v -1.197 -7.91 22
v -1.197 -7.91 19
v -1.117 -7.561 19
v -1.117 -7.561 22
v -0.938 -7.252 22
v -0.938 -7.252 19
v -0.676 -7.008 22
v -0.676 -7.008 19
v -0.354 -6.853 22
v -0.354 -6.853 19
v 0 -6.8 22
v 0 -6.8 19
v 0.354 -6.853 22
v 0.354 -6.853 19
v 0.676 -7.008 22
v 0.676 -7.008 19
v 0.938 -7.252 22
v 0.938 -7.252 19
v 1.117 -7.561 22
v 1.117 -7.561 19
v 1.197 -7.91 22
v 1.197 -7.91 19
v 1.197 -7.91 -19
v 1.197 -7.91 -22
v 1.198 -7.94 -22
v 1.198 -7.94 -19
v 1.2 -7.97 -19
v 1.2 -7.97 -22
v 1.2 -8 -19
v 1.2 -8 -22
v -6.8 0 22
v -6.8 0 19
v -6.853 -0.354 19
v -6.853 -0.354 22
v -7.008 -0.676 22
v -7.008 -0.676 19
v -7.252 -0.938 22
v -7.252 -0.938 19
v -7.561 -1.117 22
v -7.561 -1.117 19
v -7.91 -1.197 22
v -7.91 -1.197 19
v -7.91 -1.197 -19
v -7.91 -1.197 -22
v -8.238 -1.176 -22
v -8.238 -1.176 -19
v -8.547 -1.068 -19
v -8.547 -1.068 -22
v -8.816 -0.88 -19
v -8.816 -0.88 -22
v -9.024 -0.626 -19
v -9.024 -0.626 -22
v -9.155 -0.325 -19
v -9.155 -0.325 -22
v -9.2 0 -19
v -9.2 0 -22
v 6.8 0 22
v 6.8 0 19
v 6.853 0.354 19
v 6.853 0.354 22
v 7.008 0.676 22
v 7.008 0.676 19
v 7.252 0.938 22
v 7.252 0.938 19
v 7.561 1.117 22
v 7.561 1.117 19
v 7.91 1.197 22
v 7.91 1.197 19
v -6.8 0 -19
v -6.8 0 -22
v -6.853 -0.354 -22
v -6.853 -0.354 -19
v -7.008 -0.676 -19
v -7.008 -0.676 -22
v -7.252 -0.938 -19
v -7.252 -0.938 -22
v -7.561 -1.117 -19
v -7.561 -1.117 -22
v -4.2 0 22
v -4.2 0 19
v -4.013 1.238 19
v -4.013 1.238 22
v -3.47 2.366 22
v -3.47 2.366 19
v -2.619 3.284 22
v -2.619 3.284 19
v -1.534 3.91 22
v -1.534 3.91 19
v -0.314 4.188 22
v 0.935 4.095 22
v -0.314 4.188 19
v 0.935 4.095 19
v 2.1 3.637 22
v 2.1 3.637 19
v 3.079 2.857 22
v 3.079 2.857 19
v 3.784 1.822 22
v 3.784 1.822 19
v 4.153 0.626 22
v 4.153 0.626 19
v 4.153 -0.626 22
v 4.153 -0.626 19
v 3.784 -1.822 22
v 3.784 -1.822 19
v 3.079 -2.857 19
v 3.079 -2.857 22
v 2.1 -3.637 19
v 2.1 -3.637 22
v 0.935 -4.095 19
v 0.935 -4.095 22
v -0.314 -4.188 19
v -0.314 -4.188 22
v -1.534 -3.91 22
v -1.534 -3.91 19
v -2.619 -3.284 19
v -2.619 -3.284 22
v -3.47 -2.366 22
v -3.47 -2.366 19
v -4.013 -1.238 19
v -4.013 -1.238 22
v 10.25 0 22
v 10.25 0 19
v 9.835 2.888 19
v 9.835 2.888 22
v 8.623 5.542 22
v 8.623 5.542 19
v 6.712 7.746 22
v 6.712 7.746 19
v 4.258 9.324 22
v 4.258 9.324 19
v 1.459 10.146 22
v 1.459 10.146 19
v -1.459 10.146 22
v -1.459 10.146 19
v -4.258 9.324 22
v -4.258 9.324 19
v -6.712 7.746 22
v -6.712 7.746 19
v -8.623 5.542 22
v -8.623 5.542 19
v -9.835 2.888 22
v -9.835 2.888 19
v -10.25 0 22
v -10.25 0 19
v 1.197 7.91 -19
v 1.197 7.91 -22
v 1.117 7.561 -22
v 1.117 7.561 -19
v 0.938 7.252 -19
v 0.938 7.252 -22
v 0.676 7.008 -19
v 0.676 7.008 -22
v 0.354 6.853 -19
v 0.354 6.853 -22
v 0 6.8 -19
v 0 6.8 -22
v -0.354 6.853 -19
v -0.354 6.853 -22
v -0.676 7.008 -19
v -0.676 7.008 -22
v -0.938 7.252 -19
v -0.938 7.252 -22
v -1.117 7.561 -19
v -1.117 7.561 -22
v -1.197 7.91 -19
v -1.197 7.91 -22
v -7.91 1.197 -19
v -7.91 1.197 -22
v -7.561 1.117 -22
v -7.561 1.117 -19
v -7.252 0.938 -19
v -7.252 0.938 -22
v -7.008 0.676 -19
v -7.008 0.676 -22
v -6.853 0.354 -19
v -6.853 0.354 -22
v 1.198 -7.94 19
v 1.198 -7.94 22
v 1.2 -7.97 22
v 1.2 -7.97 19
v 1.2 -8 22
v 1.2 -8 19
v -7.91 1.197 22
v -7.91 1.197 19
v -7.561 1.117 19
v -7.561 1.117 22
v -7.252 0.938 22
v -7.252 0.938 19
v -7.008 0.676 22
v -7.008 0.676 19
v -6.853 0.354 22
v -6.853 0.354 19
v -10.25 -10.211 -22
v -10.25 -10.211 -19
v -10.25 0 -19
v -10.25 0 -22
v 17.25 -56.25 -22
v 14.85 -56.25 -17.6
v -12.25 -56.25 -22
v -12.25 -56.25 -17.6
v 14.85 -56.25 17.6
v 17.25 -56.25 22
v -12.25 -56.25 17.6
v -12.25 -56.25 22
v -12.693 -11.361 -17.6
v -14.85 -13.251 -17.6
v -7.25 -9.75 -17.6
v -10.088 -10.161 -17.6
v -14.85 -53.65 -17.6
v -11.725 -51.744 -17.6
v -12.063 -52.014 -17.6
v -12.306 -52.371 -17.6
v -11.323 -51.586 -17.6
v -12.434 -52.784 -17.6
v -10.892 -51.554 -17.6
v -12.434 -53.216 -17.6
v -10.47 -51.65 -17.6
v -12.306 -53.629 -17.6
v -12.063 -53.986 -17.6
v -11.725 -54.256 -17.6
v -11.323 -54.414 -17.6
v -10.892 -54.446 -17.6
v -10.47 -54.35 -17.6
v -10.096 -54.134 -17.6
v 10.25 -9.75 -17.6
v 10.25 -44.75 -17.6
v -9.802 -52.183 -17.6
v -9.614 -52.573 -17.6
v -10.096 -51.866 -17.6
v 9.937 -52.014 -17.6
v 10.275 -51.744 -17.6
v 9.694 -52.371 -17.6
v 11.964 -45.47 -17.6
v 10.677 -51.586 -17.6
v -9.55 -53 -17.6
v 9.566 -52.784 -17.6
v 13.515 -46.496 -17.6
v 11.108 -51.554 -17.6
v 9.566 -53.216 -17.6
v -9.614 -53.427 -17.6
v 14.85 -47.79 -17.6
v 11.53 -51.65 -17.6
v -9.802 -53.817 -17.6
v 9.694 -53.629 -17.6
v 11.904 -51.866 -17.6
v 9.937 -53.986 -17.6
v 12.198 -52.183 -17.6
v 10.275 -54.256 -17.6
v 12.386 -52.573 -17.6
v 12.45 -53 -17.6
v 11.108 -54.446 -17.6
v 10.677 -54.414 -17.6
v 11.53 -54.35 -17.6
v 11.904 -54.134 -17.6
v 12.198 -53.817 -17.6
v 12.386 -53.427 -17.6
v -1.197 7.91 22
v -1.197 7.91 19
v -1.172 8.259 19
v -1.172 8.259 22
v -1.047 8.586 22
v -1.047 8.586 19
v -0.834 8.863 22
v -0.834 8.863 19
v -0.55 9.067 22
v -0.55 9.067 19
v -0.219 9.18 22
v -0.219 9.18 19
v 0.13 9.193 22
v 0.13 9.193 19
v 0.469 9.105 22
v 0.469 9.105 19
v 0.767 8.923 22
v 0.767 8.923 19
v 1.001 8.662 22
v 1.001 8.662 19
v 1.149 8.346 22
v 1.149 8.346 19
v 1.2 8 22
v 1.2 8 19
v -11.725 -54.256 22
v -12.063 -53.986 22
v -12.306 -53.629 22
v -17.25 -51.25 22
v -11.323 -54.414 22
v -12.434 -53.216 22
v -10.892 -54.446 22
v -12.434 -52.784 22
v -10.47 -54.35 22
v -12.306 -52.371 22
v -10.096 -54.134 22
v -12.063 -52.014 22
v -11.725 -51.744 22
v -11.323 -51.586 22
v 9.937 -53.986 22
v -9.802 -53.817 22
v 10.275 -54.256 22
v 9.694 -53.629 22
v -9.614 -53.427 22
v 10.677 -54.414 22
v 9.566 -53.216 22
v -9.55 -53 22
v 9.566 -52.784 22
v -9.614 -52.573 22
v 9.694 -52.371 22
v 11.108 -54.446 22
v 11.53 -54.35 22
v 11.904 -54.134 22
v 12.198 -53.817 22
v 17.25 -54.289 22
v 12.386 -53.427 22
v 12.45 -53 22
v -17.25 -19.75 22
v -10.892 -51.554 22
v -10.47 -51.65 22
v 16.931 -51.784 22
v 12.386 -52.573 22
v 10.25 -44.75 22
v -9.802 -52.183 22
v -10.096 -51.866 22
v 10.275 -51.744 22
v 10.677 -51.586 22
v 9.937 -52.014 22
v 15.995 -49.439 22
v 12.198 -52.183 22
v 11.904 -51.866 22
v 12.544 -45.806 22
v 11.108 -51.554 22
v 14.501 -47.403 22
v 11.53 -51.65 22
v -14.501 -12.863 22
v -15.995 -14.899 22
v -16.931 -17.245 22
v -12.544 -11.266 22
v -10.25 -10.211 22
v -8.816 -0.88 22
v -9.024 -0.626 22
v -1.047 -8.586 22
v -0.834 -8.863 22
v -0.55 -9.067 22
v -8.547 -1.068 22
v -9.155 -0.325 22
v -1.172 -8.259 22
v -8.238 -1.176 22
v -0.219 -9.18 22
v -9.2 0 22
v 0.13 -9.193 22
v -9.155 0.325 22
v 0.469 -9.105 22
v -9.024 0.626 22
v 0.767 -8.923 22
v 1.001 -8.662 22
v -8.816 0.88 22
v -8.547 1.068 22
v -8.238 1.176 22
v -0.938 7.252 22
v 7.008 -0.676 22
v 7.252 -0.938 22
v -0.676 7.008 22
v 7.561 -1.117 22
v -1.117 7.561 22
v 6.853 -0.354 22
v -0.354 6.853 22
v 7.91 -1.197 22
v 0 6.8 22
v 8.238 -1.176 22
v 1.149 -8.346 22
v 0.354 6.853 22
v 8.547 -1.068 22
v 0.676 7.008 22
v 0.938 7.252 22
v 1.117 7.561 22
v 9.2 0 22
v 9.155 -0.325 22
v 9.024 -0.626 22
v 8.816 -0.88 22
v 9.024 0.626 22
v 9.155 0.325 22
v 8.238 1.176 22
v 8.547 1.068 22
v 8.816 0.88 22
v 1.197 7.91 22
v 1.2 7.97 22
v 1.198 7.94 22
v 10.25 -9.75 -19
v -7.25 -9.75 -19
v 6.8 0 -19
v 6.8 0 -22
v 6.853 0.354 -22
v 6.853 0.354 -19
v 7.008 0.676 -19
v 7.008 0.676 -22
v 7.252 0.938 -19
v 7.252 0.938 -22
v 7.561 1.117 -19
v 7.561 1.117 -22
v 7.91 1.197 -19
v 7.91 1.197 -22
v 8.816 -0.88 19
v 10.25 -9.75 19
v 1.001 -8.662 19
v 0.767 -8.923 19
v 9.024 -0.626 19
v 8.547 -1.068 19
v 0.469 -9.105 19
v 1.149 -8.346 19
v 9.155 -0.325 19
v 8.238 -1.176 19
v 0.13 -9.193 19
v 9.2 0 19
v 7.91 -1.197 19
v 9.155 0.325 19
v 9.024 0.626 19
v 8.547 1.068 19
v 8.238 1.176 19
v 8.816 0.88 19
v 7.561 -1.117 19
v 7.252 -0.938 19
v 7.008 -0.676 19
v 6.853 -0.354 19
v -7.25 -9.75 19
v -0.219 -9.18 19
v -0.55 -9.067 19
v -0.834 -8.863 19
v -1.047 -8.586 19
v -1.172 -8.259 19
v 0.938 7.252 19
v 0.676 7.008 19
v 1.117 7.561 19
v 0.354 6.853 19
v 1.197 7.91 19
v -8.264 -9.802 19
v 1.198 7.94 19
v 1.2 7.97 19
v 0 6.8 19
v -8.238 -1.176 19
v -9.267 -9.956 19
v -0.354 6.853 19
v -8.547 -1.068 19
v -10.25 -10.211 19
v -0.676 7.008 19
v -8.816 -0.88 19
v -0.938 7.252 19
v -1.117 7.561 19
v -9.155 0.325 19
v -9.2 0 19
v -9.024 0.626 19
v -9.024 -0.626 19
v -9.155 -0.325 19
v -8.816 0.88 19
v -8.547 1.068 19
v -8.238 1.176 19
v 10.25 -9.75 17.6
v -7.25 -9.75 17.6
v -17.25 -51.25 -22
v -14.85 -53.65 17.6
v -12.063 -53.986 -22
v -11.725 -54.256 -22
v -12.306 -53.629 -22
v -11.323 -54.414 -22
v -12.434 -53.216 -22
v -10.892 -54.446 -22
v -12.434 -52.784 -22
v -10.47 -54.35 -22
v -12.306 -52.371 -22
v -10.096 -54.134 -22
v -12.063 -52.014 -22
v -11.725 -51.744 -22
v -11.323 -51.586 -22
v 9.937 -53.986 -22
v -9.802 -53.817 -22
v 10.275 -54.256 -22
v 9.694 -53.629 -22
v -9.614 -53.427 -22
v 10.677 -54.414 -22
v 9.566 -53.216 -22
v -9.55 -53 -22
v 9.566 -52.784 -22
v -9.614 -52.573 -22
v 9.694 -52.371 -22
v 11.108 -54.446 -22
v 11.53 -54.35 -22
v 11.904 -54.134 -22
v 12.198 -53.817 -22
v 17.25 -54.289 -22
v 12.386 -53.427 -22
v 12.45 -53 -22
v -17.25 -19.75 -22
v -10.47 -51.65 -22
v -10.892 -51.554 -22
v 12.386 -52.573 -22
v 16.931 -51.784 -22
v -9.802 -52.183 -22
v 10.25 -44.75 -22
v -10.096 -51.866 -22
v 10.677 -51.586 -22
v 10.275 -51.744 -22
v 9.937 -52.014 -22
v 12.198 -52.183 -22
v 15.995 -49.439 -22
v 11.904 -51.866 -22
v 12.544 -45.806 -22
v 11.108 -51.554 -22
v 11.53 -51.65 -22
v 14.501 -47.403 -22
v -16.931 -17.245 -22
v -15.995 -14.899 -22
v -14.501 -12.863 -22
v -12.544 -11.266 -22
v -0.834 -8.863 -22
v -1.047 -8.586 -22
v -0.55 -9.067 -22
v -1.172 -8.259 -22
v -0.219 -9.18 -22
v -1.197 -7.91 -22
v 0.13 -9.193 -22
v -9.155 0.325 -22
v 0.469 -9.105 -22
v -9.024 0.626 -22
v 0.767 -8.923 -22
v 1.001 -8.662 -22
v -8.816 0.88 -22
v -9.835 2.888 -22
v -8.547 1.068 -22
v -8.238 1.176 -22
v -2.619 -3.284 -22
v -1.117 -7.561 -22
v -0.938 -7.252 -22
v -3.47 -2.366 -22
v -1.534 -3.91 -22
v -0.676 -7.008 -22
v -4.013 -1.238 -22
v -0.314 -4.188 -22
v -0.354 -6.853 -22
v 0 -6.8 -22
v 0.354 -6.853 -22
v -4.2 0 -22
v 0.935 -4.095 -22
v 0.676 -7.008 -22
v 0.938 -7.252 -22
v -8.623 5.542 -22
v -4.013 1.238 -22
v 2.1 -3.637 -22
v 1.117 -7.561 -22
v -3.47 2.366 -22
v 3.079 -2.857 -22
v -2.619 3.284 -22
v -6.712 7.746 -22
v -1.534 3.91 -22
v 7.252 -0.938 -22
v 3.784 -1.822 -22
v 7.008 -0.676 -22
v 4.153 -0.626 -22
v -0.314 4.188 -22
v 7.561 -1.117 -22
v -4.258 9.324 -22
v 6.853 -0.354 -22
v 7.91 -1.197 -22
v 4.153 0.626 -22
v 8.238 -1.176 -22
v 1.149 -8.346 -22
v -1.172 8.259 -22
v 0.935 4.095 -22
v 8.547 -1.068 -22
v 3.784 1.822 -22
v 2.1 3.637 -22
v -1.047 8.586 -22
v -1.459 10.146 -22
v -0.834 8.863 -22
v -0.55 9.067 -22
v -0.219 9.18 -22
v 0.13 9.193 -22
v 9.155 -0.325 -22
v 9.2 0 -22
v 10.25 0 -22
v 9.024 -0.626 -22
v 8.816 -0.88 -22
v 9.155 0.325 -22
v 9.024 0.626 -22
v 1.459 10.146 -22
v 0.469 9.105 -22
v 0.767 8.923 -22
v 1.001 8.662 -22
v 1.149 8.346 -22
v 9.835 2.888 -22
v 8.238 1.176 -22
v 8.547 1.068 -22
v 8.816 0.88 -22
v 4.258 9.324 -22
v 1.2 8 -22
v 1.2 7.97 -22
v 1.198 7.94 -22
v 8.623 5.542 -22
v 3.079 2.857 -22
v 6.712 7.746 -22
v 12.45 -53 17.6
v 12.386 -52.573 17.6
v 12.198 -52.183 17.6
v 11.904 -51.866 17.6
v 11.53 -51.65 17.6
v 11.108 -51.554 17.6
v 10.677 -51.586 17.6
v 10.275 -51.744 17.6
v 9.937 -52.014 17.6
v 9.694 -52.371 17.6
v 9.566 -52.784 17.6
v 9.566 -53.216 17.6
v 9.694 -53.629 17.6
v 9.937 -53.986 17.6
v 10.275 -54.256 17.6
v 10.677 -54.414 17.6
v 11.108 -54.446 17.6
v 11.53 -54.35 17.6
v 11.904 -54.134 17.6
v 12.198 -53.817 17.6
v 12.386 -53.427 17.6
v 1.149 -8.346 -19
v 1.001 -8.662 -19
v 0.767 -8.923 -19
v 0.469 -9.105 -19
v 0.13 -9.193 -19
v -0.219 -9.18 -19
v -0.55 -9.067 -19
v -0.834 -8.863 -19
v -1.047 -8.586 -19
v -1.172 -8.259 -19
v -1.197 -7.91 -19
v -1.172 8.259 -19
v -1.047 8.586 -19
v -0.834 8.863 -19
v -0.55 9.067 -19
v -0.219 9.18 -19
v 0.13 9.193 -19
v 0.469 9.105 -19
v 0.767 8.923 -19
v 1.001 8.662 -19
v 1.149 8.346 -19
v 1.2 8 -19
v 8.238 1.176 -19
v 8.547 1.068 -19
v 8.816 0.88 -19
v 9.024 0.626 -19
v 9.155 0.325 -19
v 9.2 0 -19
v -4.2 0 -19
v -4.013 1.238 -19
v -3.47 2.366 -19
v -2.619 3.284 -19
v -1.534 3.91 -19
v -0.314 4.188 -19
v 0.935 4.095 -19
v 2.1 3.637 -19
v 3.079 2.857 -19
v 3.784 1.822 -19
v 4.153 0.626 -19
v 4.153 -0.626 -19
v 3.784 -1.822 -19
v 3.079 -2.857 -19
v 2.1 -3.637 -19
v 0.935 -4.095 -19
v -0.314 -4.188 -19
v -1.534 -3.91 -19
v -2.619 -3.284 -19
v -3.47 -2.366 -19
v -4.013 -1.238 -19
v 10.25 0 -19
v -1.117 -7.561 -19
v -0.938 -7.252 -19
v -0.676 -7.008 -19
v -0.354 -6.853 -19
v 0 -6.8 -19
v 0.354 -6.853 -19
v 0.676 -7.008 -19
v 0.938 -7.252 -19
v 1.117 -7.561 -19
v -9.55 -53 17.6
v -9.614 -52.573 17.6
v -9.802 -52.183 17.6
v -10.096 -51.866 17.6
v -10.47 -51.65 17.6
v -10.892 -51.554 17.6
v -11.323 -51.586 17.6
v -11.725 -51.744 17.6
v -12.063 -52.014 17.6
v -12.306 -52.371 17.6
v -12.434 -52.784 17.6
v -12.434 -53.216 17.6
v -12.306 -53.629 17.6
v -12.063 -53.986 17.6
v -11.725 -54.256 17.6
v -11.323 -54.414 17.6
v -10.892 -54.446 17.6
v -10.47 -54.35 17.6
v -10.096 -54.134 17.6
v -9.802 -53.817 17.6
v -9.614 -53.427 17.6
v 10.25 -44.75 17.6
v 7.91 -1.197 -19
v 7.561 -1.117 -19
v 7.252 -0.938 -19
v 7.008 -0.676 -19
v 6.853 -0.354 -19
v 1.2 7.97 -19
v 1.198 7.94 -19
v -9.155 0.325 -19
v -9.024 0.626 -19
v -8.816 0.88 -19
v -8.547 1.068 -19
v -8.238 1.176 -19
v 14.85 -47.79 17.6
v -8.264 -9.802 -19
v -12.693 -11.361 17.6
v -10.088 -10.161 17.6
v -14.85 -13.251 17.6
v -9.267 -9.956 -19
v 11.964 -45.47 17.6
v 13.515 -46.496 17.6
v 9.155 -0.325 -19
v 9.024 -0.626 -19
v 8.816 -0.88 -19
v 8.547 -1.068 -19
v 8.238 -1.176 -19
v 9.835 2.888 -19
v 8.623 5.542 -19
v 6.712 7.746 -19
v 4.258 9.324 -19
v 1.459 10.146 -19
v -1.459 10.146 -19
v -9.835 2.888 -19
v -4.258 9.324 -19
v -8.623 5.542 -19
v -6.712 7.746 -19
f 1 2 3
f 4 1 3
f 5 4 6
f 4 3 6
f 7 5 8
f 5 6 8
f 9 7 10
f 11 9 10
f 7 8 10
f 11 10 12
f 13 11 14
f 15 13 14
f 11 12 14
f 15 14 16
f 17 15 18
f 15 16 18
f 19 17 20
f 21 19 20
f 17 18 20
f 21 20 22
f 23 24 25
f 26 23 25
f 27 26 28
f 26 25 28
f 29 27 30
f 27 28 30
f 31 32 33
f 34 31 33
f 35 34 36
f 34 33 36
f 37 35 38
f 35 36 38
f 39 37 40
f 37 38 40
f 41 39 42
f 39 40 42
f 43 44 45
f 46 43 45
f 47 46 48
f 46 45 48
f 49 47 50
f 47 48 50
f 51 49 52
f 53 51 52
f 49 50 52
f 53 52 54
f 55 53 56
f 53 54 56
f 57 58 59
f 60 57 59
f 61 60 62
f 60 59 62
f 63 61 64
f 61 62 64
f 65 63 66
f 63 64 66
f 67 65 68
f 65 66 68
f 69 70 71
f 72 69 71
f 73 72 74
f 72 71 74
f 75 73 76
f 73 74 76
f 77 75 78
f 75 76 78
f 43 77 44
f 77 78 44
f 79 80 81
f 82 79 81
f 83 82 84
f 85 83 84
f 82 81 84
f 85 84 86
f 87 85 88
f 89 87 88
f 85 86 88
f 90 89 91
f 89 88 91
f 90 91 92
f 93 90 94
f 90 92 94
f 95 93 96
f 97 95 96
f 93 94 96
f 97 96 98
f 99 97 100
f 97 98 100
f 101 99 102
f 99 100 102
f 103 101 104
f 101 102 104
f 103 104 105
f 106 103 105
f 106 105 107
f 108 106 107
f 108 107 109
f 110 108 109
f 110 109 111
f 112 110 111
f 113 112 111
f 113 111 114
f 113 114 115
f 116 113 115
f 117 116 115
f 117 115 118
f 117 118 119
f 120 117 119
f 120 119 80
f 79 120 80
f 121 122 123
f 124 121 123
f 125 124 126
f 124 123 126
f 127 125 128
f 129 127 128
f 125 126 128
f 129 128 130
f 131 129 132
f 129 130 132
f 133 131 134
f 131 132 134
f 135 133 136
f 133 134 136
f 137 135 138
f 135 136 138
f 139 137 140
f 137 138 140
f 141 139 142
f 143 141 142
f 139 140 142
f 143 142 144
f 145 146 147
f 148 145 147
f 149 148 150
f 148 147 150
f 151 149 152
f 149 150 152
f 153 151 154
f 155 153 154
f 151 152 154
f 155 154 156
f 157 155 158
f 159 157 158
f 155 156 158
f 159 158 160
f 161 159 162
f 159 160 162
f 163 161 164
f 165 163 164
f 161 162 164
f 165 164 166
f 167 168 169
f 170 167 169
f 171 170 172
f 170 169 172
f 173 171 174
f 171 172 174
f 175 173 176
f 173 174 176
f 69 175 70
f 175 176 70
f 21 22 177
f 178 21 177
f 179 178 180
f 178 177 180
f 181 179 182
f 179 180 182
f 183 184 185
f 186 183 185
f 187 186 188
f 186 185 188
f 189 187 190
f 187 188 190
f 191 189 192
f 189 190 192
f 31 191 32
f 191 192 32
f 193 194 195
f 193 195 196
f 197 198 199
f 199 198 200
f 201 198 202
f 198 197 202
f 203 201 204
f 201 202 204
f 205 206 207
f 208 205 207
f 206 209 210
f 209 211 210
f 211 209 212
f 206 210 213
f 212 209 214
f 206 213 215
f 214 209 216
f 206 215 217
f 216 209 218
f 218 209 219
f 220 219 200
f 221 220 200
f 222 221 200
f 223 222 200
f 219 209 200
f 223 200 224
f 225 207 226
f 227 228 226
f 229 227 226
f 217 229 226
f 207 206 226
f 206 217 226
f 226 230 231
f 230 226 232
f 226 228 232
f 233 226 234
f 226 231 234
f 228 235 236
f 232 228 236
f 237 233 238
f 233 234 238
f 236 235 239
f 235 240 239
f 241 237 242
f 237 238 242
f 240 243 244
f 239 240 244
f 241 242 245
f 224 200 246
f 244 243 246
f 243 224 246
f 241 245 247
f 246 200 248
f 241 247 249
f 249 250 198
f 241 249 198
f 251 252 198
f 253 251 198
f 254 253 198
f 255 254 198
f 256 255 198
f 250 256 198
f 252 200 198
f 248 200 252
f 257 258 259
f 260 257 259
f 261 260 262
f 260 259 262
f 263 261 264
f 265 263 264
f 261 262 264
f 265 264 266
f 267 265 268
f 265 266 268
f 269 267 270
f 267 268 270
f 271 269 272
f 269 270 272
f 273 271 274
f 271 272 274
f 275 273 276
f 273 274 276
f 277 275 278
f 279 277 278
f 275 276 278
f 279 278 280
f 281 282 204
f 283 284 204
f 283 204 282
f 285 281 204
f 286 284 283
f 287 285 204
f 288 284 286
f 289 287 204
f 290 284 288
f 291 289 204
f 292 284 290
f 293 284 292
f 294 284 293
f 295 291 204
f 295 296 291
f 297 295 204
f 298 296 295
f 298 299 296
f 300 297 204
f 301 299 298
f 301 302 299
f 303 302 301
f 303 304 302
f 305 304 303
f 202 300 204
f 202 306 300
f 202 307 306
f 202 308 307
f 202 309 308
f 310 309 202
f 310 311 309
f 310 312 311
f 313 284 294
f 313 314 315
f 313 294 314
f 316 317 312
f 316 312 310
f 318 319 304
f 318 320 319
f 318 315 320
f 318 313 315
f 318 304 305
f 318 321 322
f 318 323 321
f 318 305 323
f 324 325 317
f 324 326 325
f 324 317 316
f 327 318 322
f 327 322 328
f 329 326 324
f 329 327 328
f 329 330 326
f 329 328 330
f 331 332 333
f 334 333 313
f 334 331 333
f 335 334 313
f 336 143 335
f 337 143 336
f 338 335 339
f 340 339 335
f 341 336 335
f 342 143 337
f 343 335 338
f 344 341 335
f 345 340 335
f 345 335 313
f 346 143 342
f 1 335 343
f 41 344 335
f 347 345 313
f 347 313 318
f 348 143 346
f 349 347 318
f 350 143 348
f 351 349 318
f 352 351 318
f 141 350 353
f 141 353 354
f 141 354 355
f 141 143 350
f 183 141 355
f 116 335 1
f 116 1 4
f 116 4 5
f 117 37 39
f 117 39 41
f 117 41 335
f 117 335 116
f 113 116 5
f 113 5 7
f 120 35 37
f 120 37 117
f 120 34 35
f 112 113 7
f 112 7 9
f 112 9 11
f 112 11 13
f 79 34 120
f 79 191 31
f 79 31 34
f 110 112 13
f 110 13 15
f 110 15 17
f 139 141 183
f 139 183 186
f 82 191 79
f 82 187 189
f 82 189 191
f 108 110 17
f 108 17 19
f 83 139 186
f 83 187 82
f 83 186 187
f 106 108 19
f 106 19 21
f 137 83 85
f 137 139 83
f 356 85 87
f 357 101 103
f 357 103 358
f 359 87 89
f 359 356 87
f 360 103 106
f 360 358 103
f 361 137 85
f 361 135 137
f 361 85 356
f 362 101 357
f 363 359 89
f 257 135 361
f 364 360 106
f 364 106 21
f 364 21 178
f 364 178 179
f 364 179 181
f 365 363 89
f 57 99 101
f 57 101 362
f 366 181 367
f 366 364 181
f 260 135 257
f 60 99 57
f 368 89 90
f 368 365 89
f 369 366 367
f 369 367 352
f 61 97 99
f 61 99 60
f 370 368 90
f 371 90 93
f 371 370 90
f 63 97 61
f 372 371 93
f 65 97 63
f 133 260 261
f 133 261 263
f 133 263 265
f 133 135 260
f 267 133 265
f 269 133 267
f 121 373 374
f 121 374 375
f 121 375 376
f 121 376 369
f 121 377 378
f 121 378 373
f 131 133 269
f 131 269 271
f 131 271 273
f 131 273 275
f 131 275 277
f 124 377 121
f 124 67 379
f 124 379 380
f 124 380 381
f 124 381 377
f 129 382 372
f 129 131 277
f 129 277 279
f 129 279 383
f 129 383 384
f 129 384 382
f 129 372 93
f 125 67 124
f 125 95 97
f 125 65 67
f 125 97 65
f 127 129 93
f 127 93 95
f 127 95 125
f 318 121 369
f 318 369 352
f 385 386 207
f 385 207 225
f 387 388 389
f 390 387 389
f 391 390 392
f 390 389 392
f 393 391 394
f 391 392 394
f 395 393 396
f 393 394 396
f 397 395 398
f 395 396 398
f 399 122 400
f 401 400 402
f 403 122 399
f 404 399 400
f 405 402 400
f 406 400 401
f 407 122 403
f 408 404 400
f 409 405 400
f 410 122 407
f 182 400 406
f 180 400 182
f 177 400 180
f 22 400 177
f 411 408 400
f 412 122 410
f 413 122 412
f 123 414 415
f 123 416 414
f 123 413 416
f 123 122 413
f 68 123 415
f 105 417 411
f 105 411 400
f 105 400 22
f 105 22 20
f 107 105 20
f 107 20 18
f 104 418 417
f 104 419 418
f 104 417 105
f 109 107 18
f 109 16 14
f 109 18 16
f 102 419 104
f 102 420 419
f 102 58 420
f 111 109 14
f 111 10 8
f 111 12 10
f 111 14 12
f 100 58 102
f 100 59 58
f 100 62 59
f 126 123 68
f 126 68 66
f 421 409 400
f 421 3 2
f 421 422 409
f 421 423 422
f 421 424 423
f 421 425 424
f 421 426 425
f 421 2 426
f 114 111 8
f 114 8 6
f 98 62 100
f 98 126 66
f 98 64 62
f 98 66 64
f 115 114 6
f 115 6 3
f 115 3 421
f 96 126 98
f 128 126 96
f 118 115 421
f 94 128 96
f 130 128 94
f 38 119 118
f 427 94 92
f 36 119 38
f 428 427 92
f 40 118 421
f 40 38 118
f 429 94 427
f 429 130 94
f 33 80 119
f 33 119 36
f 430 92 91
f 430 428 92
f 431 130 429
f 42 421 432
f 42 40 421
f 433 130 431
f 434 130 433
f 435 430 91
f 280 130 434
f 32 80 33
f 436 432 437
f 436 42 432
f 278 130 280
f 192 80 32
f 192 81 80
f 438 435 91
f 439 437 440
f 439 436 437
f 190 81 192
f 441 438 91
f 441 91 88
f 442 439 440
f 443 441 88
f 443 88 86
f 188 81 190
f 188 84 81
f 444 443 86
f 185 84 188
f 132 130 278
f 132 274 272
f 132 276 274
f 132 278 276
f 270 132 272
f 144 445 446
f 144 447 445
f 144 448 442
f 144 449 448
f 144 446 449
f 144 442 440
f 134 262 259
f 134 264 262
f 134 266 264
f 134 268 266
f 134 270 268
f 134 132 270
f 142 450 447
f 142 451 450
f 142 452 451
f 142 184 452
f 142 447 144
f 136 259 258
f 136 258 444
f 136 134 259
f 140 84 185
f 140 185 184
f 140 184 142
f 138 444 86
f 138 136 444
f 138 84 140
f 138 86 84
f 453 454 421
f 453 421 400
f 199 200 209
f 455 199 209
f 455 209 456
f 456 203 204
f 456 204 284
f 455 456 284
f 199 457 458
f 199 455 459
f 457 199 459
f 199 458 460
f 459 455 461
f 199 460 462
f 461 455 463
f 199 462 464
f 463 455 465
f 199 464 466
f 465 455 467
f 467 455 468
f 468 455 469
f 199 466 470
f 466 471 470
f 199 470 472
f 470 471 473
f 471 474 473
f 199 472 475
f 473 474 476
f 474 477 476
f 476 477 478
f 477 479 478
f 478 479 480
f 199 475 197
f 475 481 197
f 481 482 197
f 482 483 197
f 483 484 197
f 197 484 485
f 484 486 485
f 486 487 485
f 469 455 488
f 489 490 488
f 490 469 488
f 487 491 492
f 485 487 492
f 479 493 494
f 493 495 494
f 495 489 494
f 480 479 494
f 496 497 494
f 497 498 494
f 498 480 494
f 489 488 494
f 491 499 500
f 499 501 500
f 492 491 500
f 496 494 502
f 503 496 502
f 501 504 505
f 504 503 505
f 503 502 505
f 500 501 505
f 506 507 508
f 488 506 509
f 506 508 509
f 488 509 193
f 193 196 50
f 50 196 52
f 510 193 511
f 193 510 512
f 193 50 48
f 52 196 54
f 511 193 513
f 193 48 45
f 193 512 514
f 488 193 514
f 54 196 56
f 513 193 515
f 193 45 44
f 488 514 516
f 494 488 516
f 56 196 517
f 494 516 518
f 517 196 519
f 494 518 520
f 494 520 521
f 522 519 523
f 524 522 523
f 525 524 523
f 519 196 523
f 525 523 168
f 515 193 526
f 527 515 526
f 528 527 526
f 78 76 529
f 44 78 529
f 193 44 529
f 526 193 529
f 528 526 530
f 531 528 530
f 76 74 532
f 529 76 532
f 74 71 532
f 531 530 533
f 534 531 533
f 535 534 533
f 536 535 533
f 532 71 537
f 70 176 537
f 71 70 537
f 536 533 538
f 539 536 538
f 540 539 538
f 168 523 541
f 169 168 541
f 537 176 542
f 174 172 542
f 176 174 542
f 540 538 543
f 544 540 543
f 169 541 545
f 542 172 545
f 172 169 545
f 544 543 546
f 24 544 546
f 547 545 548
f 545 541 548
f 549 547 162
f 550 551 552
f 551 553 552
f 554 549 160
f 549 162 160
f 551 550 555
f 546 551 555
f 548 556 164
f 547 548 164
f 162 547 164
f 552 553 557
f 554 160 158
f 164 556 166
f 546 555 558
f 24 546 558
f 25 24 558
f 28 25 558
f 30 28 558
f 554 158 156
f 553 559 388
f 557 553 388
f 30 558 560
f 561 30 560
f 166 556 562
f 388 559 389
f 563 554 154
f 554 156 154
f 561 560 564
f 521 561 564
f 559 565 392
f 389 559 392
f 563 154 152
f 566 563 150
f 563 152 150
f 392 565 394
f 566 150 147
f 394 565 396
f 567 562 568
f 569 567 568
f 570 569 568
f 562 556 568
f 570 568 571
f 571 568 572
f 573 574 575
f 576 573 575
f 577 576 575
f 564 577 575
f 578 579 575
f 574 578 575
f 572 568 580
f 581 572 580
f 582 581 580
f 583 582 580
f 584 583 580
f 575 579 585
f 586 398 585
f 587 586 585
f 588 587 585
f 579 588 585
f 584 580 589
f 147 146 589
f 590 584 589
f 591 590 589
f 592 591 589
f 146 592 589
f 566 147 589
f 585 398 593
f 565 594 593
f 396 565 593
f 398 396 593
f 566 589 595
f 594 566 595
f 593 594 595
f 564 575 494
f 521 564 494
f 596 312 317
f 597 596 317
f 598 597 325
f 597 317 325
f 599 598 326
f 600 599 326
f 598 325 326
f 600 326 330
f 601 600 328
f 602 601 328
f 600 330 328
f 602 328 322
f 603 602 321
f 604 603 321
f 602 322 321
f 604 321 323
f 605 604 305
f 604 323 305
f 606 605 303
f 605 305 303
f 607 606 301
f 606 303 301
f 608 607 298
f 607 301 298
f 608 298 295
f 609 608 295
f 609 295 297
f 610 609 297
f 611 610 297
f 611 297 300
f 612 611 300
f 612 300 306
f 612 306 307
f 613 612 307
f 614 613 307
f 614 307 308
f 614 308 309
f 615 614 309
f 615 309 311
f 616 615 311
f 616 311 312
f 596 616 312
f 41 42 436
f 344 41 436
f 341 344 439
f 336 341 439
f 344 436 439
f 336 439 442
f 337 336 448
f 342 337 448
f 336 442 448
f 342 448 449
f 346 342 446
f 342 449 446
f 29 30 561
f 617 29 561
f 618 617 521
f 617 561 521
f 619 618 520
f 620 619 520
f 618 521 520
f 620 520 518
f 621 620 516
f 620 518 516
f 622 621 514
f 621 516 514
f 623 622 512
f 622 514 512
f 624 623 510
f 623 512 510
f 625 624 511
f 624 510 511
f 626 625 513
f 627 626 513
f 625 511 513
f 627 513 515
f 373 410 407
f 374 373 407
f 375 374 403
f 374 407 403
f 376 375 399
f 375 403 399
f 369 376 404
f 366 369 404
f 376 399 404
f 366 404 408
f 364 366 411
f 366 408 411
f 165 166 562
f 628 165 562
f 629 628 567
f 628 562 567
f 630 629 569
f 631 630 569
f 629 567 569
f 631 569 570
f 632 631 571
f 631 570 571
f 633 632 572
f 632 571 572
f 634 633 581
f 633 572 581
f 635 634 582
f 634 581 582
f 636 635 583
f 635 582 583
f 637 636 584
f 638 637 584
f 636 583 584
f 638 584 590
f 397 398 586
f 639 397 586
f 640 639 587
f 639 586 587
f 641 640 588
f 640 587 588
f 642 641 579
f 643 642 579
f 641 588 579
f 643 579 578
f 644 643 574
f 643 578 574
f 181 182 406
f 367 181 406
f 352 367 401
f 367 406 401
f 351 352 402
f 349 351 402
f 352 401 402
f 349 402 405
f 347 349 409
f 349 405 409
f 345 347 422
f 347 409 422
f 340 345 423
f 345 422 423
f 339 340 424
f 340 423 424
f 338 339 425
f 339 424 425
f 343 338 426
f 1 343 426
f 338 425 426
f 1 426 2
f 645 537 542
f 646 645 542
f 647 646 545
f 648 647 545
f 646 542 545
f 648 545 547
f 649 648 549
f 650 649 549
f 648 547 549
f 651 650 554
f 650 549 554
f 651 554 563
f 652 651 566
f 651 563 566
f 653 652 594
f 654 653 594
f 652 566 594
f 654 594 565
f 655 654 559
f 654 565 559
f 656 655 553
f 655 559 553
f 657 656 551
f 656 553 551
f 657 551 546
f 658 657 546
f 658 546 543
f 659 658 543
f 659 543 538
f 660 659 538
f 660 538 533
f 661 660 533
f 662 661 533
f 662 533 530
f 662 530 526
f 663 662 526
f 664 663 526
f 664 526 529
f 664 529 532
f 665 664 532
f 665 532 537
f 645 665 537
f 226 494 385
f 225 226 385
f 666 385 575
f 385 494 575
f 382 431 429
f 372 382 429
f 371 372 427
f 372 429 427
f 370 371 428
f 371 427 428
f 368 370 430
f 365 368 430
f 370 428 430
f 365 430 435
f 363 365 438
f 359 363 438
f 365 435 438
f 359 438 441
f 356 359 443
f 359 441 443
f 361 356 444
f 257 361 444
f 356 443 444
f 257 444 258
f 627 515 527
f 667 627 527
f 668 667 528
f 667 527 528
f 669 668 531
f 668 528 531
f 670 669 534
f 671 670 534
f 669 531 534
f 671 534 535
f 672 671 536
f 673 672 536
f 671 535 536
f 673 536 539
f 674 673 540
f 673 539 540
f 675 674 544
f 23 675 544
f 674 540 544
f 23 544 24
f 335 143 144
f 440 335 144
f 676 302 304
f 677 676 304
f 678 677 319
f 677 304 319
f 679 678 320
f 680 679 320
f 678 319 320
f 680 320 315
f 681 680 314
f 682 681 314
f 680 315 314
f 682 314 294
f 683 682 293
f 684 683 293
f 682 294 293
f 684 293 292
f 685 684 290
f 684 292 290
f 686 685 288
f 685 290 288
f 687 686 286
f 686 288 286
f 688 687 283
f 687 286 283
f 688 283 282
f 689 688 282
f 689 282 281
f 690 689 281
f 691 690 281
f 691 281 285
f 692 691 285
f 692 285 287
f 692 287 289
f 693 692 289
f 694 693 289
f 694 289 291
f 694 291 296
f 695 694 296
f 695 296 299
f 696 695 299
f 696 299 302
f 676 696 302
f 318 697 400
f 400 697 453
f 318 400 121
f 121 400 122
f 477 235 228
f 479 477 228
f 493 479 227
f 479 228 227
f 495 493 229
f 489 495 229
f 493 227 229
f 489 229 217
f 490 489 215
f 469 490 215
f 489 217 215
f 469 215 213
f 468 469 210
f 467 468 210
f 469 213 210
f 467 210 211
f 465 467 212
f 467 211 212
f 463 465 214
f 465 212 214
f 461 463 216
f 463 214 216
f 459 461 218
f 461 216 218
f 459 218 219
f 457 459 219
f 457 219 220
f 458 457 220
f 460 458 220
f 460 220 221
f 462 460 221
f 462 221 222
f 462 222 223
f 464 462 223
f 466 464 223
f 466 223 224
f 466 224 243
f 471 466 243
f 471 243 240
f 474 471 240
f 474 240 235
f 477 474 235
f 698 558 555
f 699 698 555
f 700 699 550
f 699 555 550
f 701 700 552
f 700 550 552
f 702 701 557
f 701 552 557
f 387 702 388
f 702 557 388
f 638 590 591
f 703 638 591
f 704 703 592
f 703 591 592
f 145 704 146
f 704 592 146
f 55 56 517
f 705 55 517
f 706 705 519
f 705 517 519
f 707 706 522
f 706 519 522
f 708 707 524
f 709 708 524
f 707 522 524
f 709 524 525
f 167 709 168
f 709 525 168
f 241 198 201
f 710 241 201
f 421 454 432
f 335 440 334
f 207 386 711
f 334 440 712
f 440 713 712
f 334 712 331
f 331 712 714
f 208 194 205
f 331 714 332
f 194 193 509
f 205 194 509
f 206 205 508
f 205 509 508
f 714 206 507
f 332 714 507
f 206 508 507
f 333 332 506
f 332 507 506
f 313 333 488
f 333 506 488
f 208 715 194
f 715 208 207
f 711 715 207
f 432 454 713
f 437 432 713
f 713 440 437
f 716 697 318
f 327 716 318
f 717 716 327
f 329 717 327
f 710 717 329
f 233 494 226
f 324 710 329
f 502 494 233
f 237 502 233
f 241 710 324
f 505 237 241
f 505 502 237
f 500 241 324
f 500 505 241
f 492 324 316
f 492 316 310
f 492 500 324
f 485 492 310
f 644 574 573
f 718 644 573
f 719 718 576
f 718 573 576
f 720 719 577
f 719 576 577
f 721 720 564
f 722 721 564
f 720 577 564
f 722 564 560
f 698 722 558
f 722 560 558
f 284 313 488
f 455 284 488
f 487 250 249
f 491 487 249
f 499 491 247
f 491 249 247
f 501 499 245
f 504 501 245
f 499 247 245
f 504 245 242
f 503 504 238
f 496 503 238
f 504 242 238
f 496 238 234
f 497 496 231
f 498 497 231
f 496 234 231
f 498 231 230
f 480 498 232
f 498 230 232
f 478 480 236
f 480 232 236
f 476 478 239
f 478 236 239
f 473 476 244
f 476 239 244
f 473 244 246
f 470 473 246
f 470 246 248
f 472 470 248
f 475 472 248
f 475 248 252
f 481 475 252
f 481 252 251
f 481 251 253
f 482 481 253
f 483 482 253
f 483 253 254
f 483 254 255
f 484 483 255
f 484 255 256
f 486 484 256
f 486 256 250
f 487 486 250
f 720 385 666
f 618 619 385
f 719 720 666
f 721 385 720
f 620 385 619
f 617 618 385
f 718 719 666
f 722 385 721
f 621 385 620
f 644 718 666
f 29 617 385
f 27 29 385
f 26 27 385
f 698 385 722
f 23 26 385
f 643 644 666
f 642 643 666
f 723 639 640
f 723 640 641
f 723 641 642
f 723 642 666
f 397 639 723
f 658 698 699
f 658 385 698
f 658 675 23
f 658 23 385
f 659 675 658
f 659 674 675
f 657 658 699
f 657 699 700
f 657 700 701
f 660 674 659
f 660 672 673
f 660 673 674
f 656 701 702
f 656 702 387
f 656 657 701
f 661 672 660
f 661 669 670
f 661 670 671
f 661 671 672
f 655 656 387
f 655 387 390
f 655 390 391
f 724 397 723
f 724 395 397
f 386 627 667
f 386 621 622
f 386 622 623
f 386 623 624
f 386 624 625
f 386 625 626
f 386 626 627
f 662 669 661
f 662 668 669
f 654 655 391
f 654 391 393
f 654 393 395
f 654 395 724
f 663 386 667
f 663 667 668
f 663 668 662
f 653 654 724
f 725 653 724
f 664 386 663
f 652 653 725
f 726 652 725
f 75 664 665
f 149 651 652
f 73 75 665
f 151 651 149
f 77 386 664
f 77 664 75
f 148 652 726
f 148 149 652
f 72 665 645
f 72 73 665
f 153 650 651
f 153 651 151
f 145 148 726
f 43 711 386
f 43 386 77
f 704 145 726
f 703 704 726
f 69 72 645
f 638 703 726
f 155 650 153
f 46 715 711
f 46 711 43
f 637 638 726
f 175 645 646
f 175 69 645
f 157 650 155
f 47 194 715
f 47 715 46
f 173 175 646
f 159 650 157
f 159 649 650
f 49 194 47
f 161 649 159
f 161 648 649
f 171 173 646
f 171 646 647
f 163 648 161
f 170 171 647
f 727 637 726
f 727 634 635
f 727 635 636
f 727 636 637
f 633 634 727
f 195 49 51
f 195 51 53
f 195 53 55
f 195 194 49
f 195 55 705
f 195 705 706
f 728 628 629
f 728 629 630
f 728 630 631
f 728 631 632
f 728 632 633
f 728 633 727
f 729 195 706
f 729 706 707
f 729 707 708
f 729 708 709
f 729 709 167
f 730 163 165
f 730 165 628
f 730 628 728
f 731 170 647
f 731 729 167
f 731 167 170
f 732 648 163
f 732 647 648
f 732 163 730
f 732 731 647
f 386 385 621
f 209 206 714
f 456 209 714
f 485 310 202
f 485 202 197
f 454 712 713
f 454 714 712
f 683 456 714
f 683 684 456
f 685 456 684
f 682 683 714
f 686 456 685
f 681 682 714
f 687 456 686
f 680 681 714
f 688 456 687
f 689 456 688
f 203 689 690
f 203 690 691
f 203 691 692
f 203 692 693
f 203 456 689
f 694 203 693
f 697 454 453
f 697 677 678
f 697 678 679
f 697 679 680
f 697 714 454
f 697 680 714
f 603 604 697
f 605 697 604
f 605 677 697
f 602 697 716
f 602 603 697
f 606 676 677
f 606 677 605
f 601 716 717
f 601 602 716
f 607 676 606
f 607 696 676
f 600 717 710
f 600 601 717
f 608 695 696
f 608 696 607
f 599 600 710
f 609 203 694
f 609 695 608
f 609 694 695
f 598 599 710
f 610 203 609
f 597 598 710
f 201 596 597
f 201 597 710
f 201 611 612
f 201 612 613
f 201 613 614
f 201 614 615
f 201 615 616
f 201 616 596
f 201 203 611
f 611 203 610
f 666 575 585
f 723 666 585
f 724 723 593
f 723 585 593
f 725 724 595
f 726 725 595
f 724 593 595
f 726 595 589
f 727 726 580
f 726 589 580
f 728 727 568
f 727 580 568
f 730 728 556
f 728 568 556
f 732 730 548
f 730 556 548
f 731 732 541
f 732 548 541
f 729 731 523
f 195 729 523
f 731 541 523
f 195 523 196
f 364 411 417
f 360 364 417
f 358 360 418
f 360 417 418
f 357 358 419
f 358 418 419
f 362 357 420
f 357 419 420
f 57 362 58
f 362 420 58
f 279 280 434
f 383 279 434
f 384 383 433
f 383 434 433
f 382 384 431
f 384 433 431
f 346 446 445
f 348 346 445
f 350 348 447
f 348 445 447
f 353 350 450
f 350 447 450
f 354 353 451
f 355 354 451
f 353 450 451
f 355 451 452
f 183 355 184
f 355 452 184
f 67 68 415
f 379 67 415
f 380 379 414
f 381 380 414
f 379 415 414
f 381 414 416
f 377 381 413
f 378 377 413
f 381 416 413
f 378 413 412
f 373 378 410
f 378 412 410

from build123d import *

# Parameters (mm, degrees)
BOSS_EXTRUDE1_DEPTH      = 22
BOSS_EXTRUDE1_DEPTH_BACK = 22
SKETCH2_W                = 38
SKETCH2_H                = 20
CUT_EXTRUDE1_DEPTH       = 105.423416914
SKETCH3_W                = 7
SKETCH3_H                = 44
BOSS_EXTRUDE2_DEPTH      = 65.5
SKETCH23_R               = 5
SKETCH23_R_2             = 1.2
CUT_EXTRUDE2_DEPTH       = 111.605436123
SKETCH24_W               = 28.5
SKETCH24_H               = 34
CUT_EXTRUDE3_DEPTH       = 90.954502389
SKETCH26_R               = 1.2
SKETCH26_R_2             = 5
SKETCH26_R_3             = 1.45
CUT_EXTRUDE6_DEPTH       = 107.330263801
SKETCH27_W               = 29.7
SKETCH27_H               = 35.2
CUT_EXTRUDE8_DEPTH       = 73.137455597
SKETCH29_W               = 7
SKETCH29_H               = 35
CUT_EXTRUDE10_DEPTH      = 74.468530678
CHAMFER2_SIZE            = 5
FILLET1_START            = -23
FILLET1_DEPTH            = 46
FILLET2_R                = 10


with BuildPart() as part:
    # Sketch1 → Boss-Extrude1 (new, two sides: drawn at the far end of the back side and taken through both)
    with BuildSketch(Plane.XY.offset(-BOSS_EXTRUDE1_DEPTH_BACK)):
        with BuildLine():
            Line((10.25, -60), (10.25, 0))
            ThreePointArc((10.25, 0), (0, -10.25), (-10.25, 0))
            Line((-10.25, 0), (-10.25, -60))
            Line((-10.25, -60), (-10.25, -100))
            Line((-10.25, -100), (10.25, -100))
            Line((10.25, -100), (10.25, -60))
        make_face()
        with BuildLine():
            Line((10.25, 0), (9.2, 0))
            ThreePointArc((9.2, 0), (8.816088231, -0.879772698), (7.91, -1.196620241))
            ThreePointArc((7.91, -1.196620241), (5.656854249, -5.656854249), (1.196620241, -7.91))
            ThreePointArc((1.196620241, -7.91), (1.199154762, -7.954968281), (1.2, -8))
            ThreePointArc((1.2, -8), (-0.045031719, -9.199154762), (-1.196620241, -7.91))
            ThreePointArc((-1.196620241, -7.91), (-5.656854249, -5.656854249), (-7.91, -1.196620241))
            ThreePointArc((-7.91, -1.196620241), (-8.816088231, -0.879772698), (-9.2, 0))
            Line((-9.2, 0), (-10.25, 0))
            ThreePointArc((-10.25, 0), (0, -10.25), (10.25, 0))
        make_face()
        with BuildLine():
            ThreePointArc((7.91, -1.196620241), (7.120227302, -0.816088231), (6.8, 0))
            Line((6.8, 0), (4.2, 0))
            ThreePointArc((4.2, 0), (0, -4.2), (-4.2, 0))
            Line((-4.2, 0), (-6.8, 0))
            ThreePointArc((-6.8, 0), (-7.120227302, -0.816088231), (-7.91, -1.196620241))
            ThreePointArc((-7.91, -1.196620241), (-5.656854249, -5.656854249), (-1.196620241, -7.91))
            ThreePointArc((-1.196620241, -7.91), (0, -6.8), (1.196620241, -7.91))
            ThreePointArc((1.196620241, -7.91), (5.656854249, -5.656854249), (7.91, -1.196620241))
        make_face()
        with BuildLine():
            Line((4.2, 0), (6.8, 0))
            ThreePointArc((6.8, 0), (7.120227302, 0.816088231), (7.91, 1.196620241))
            ThreePointArc((7.91, 1.196620241), (5.656854249, 5.656854249), (1.196620241, 7.91))
            ThreePointArc((1.196620241, 7.91), (0, 6.8), (-1.196620241, 7.91))
            ThreePointArc((-1.196620241, 7.91), (-5.656854249, 5.656854249), (-7.91, 1.196620241))
            ThreePointArc((-7.91, 1.196620241), (-7.120227302, 0.816088231), (-6.8, 0))
            Line((-6.8, 0), (-4.2, 0))
            ThreePointArc((-4.2, 0), (0, 4.2), (4.2, 0))
        make_face()
        with BuildLine():
            ThreePointArc((7.91, 1.196620241), (8.816088231, 0.879772698), (9.2, 0))
            Line((9.2, 0), (10.25, 0))
            ThreePointArc((10.25, 0), (0, 10.25), (-10.25, 0))
            Line((-10.25, 0), (-9.2, 0))
            ThreePointArc((-9.2, 0), (-8.816088231, 0.879772698), (-7.91, 1.196620241))
            ThreePointArc((-7.91, 1.196620241), (-5.656854249, 5.656854249), (-1.196620241, 7.91))
            ThreePointArc((-1.196620241, 7.91), (-0.045031719, 9.199154762), (1.2, 8))
            ThreePointArc((1.2, 8), (1.199154762, 7.954968281), (1.196620241, 7.91))
            ThreePointArc((1.196620241, 7.91), (5.656854249, 5.656854249), (7.91, 1.196620241))
        make_face()
    extrude(amount=BOSS_EXTRUDE1_DEPTH + BOSS_EXTRUDE1_DEPTH_BACK)

    # Sketch2 → Cut-Extrude1 (cut, through all)
    with BuildSketch(Plane.ZY.offset(10.25)):
        with Locations((0, 0.25)):
            Rectangle(SKETCH2_W, SKETCH2_H)
    extrude(amount=-CUT_EXTRUDE1_DEPTH, mode=Mode.SUBTRACT)

    # Sketch3 → Boss-Extrude2 (add)
    with BuildSketch(Plane(origin=(0, -9.75, 0), x_dir=(1, 0, 0), z_dir=(0, 1, 0))):
        with Locations((-13.75, 0)):
            Rectangle(SKETCH3_W, SKETCH3_H)
        with Locations((13.75, 0)):
            Rectangle(SKETCH3_W, SKETCH3_H)
    extrude(amount=-BOSS_EXTRUDE2_DEPTH)

    # Sketch23 → Cut-Extrude2 (cut, through all)
    with BuildSketch(Plane.XY.offset(22)):
        with BuildLine():
            Line((-10.25, -100), (10.25, -100))
            Line((10.25, -100), (10.25, -85))
            ThreePointArc((10.25, -85), (0, -95.25), (-10.25, -85))
            Line((-10.25, -85), (-10.25, -100))
        make_face()
        with Locations((0, -85)):
            Circle(SKETCH23_R)
        with Locations((8, -85)):
            Circle(SKETCH23_R_2)
        with Locations((0, -77)):
            Circle(SKETCH23_R_2)
        with Locations((0, -93)):
            Circle(SKETCH23_R_2)
        with Locations((-8, -85)):
            Circle(SKETCH23_R_2)
    extrude(amount=-CUT_EXTRUDE2_DEPTH, mode=Mode.SUBTRACT)

    # Sketch24 → Cut-Extrude3 (cut, through all)
    with BuildSketch(Plane(origin=(0, -9.75, 0), x_dir=(1, 0, 0), z_dir=(0, 1, 0))):
        Rectangle(SKETCH24_W, SKETCH24_H)
    extrude(amount=-CUT_EXTRUDE3_DEPTH, mode=Mode.SUBTRACT)

    # Sketch26 → Cut-Extrude6 (cut, through all)
    # profile 1 of 5: a face of its own
    with BuildSketch(Plane.XY.offset(22)):
        with BuildLine():
            Line((10.25, -75.25), (14.25, -75.25))
            Line((14.25, -75.25), (14.25, -56.53282359))
            Line((14.25, -56.53282359), (14.25, -56.25))
            Line((14.25, -56.25), (-14.25, -56.25))
            Line((-14.25, -56.25), (-14.25, -56.53282359))
            Line((-14.25, -56.53282359), (-14.25, -75.25))
            Line((-14.25, -75.25), (-10.25, -75.25))
            Line((-10.25, -75.25), (-10.25, -85))
            ThreePointArc((-10.25, -85), (0, -95.25), (10.25, -85))
            Line((10.25, -85), (10.25, -75.25))
        make_face()
        with Locations((-8, -85)):
            Circle(SKETCH26_R, mode=Mode.SUBTRACT)
        with Locations((0, -85)):
            Circle(SKETCH26_R_2, mode=Mode.SUBTRACT)
        with Locations((0, -77)):
            Circle(SKETCH26_R, mode=Mode.SUBTRACT)
        with Locations((0, -93)):
            Circle(SKETCH26_R, mode=Mode.SUBTRACT)
        with Locations((8, -85)):
            Circle(SKETCH26_R, mode=Mode.SUBTRACT)
    # profile 2 of 5: a face of its own
    with BuildSketch(Plane.XY.offset(22)):
        Polygon((-17.25, -75.25), (-14.25, -75.25), (-14.25, -56.53282359), (-14.25, -56.25), (-17.25, -56.25), align=None)
    # profile 3 of 5: a face of its own
    with BuildSketch(Plane.XY.offset(22)):
        Polygon((14.25, -56.53282359), (14.25, -75.25), (17.25, -75.25), (17.25, -56.25), (14.25, -56.25), align=None)
    # profile 4 of 5: a face of its own
    with BuildSketch(Plane.XY.offset(22)):
        with Locations((-11, -53)):
            Circle(SKETCH26_R_3)
    # profile 5 of 5: a face of its own
    with BuildSketch(Plane.XY.offset(22)):
        with Locations((11, -53)):
            Circle(SKETCH26_R_3)
    extrude(amount=-CUT_EXTRUDE6_DEPTH, mode=Mode.SUBTRACT)

    # Sketch27 → Cut-Extrude8 (cut, through all)
    with BuildSketch(Plane.XZ.offset(56.25)):
        Rectangle(SKETCH27_W, SKETCH27_H)
    extrude(amount=-CUT_EXTRUDE8_DEPTH, mode=Mode.SUBTRACT)

    # Sketch29 → Cut-Extrude10 (cut, through all)
    with BuildSketch(Plane(origin=(0, 0, -22), x_dir=(-1, 0, 0), z_dir=(0, 0, -1))):
        with Locations((-13.75, -27.25)):
            Rectangle(SKETCH29_W, SKETCH29_H)
    extrude(amount=-CUT_EXTRUDE10_DEPTH, mode=Mode.SUBTRACT)

    # Chamfer2
    # the kernel refuses this chamfer: 5 mm, written as the material it takes off along each edge
    with BuildSketch(Plane(origin=(-17.25, -56.25, 34.85841494), x_dir=(1, 0, 0), z_dir=(0, 0, -1))) as chamfer2_piece_1:
        Polygon((CHAMFER2_SIZE, 0), (0, -CHAMFER2_SIZE), (0, 0), align=None)
    extrude(amount=69.71682988, mode=Mode.SUBTRACT)

    # Fillet1: read off the stored shape, not the designer's step
    # Fillet1 outline → Fillet1 (cut)
    with BuildSketch(Plane.XY.offset(FILLET1_START)):
        with BuildLine():
            ThreePointArc((10.25, -44.75), (15.312257748, -48.373312231), (17.25, -54.289392014))
            Line((17.25, -54.289392014), (17.25, -44.75))
            Line((17.25, -44.75), (10.25, -44.75))
        make_face()
    extrude(amount=FILLET1_DEPTH, mode=Mode.SUBTRACT)

    # Fillet2
    # the kernel refuses this fillet: 10 mm, written as the material it takes off along each edge
    with BuildSketch(Plane(origin=(-17.25, -9.75, -47), x_dir=(1, 0, 0), z_dir=(0, 0, 1))) as fillet2_piece_1_section:
        with BuildLine():
            CenterArc((FILLET2_R, -FILLET2_R), FILLET2_R, 90, 90)
            Line((0, -FILLET2_R), (0, 0))
            Line((0, 0), (FILLET2_R, 0))
        make_face()
    fillet2_piece_1 = extrude(amount=94, mode=Mode.PRIVATE)
    fillet2_piece_1 = split(fillet2_piece_1, bisect_by=Plane(origin=(-10.25, -9.75, -47), z_dir=(-1, 0, 0)), keep=Keep.TOP, mode=Mode.PRIVATE)
    add(fillet2_piece_1, mode=Mode.SUBTRACT)
    with BuildSketch(Plane(origin=(-17.25, -9.75, -47), x_dir=(1, 0, 0), z_dir=(0, 0, 1))) as fillet2_piece_2_section:
        with BuildLine():
            CenterArc((FILLET2_R, -FILLET2_R), FILLET2_R, 90, 90)
            Line((0, -FILLET2_R), (0, 0))
            Line((0, 0), (FILLET2_R, 0))
        make_face()
    fillet2_piece_2 = extrude(amount=94, mode=Mode.PRIVATE)
    fillet2_piece_2 = split(fillet2_piece_2, bisect_by=Plane(origin=(-17.25, -9.75, -19), z_dir=(0, 0, 1)), keep=Keep.TOP, mode=Mode.PRIVATE)
    fillet2_piece_2 = split(fillet2_piece_2, bisect_by=Plane(origin=(-17.25, -9.75, 19), z_dir=(0, 0, -1)), keep=Keep.TOP, mode=Mode.PRIVATE)
    add(fillet2_piece_2, mode=Mode.SUBTRACT)


solid = part.part
